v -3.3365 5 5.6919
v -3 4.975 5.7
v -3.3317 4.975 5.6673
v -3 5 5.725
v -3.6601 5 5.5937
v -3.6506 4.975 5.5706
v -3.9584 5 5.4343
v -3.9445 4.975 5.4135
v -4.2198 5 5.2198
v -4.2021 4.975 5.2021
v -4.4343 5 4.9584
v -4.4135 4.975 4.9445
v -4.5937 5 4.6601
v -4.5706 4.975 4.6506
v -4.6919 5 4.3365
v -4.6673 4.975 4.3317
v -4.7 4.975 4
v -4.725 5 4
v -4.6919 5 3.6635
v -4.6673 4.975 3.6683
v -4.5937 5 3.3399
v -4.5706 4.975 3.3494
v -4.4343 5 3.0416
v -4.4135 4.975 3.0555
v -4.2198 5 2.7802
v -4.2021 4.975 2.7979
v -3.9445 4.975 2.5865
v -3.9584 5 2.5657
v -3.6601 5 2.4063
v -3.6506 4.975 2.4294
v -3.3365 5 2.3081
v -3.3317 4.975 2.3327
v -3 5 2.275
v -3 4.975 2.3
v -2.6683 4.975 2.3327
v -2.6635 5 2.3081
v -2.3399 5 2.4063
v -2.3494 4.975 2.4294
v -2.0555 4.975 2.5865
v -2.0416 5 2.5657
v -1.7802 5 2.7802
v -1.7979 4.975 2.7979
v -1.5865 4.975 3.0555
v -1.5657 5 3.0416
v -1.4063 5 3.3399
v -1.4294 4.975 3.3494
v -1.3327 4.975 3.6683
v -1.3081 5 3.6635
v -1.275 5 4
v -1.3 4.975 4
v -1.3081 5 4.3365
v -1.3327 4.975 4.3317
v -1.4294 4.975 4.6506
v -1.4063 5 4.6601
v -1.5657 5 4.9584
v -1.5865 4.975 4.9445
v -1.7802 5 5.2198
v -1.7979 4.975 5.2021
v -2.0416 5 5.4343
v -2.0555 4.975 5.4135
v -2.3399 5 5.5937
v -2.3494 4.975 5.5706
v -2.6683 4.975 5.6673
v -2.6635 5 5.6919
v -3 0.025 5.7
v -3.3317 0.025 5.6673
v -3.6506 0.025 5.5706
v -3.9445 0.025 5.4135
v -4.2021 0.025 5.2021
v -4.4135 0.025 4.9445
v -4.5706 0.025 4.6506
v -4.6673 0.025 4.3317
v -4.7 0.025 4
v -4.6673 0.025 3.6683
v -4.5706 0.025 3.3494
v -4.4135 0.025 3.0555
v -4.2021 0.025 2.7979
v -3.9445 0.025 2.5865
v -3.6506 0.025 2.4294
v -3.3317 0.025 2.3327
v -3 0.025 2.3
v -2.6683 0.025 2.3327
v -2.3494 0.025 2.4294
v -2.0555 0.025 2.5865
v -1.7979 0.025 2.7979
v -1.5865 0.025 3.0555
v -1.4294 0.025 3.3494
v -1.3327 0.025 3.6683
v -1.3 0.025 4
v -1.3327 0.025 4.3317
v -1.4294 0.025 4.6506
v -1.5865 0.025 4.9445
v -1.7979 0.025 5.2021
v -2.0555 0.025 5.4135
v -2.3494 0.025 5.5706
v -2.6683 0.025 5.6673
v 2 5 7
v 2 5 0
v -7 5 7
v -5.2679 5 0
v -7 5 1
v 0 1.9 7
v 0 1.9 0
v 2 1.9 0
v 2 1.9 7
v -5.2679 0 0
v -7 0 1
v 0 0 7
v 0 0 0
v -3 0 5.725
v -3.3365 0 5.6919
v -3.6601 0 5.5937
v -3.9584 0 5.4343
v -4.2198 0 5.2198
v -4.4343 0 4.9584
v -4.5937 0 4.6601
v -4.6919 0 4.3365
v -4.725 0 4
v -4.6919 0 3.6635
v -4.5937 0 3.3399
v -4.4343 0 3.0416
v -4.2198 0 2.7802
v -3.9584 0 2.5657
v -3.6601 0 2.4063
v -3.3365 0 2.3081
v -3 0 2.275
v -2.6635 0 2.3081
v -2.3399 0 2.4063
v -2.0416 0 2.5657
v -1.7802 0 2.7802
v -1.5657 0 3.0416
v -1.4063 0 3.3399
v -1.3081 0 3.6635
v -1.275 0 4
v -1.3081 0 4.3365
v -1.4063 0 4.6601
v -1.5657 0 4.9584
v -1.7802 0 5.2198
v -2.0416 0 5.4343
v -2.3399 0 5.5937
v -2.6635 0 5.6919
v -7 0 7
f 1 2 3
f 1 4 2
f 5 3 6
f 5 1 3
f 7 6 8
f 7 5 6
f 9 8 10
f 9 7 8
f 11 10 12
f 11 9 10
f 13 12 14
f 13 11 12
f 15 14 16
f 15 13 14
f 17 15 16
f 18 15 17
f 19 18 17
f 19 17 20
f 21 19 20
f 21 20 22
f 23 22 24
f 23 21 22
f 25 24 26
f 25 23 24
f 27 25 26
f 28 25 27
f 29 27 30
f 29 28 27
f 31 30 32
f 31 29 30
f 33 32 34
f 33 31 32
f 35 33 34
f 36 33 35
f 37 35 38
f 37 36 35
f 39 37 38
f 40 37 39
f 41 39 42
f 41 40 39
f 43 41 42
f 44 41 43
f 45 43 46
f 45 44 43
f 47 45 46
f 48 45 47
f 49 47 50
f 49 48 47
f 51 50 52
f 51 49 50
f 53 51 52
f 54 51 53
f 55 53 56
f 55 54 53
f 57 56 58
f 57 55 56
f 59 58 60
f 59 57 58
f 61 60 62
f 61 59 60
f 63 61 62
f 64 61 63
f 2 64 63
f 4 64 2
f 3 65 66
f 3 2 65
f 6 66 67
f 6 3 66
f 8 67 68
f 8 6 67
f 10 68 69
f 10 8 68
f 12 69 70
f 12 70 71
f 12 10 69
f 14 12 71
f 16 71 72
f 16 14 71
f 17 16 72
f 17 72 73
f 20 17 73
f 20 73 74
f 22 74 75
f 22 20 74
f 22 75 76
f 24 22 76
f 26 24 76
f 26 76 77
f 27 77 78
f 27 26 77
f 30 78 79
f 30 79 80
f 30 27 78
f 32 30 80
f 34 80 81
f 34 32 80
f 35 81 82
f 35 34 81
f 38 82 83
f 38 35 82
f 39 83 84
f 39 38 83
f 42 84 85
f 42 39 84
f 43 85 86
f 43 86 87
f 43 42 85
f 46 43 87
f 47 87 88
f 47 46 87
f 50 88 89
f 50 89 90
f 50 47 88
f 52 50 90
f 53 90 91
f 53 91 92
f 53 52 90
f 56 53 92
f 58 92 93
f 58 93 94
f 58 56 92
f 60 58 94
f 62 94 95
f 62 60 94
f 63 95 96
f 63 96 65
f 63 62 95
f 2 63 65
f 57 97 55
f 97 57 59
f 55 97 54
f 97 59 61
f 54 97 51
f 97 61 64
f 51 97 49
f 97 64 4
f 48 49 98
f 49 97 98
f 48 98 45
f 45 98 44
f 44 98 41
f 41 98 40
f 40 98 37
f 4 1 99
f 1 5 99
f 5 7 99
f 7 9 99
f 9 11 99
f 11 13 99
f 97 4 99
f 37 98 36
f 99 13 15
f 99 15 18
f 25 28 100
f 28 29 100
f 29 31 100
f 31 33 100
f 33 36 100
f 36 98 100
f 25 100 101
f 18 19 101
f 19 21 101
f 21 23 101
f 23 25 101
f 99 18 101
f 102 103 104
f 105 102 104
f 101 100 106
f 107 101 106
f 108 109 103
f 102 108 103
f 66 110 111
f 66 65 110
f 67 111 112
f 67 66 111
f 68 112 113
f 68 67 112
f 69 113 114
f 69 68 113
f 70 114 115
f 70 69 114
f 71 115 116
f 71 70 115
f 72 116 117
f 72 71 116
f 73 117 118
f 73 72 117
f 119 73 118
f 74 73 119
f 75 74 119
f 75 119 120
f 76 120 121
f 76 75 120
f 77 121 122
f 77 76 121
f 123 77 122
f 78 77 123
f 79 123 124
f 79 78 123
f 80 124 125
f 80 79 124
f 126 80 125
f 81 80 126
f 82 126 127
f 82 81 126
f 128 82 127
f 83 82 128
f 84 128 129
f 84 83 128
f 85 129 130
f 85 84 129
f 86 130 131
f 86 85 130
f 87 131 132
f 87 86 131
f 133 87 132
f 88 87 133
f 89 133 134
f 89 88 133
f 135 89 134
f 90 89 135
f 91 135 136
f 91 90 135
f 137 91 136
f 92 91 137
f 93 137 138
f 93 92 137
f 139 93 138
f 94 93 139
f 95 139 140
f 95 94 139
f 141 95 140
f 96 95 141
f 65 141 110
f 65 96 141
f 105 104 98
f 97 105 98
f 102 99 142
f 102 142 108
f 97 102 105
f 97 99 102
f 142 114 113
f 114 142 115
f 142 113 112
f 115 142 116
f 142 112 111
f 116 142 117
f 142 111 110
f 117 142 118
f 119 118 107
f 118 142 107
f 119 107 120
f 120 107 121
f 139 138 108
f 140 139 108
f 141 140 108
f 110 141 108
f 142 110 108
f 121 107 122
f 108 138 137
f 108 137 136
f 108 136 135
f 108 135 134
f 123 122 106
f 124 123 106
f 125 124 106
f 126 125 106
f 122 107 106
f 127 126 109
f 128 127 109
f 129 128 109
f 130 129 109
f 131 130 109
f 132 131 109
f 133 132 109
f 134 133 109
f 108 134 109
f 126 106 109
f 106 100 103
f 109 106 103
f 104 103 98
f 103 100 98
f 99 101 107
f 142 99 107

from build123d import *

# Parameters (mm, degrees)
EXTRUDE_1_DEPTH = 7
CHAMFER_1_SIZE  = 1
CHAMFER_1_SIZE2 = 1.732050808


with BuildPart() as part:
    # Эскиз1 → Бобышка-Вытянуть1 (new body)
    with BuildSketch(Plane.XY):
        Polygon((0, 0), (0, 1.9), (2, 1.9), (2, 5), (-7, 5), (-7, 0), align=None)
    extrude(amount=EXTRUDE_1_DEPTH)

    # Эскиз4 → Отверстие с зазором M31 (revolve, cut)
    with BuildSketch(Plane(origin=(-3, 5, 4), x_dir=(0, 0, 1), z_dir=(1, 0, 0))):
        Polygon((0, 0), (0, 5), (1.725, 5), (1.7, 4.975), (1.7, 0.025), (1.725, 0), align=None)
    revolve(axis=Axis((-3, 11.35, 4), (0, -1, 0)), mode=Mode.SUBTRACT)

    # Фаска1
    chamfer_1_edges = [part.edges().sort_by_distance(p)[0] for p in [
        (-7, 2.5, 0),
    ]]
    chamfer_1_side = [part.faces().sort_by_distance(p)[0] for p in [
        (-7, 2.5, 3.5),
    ]]
    chamfer(chamfer_1_edges, length=CHAMFER_1_SIZE, length2=CHAMFER_1_SIZE2, reference=chamfer_1_side[0])


solid = part.part
